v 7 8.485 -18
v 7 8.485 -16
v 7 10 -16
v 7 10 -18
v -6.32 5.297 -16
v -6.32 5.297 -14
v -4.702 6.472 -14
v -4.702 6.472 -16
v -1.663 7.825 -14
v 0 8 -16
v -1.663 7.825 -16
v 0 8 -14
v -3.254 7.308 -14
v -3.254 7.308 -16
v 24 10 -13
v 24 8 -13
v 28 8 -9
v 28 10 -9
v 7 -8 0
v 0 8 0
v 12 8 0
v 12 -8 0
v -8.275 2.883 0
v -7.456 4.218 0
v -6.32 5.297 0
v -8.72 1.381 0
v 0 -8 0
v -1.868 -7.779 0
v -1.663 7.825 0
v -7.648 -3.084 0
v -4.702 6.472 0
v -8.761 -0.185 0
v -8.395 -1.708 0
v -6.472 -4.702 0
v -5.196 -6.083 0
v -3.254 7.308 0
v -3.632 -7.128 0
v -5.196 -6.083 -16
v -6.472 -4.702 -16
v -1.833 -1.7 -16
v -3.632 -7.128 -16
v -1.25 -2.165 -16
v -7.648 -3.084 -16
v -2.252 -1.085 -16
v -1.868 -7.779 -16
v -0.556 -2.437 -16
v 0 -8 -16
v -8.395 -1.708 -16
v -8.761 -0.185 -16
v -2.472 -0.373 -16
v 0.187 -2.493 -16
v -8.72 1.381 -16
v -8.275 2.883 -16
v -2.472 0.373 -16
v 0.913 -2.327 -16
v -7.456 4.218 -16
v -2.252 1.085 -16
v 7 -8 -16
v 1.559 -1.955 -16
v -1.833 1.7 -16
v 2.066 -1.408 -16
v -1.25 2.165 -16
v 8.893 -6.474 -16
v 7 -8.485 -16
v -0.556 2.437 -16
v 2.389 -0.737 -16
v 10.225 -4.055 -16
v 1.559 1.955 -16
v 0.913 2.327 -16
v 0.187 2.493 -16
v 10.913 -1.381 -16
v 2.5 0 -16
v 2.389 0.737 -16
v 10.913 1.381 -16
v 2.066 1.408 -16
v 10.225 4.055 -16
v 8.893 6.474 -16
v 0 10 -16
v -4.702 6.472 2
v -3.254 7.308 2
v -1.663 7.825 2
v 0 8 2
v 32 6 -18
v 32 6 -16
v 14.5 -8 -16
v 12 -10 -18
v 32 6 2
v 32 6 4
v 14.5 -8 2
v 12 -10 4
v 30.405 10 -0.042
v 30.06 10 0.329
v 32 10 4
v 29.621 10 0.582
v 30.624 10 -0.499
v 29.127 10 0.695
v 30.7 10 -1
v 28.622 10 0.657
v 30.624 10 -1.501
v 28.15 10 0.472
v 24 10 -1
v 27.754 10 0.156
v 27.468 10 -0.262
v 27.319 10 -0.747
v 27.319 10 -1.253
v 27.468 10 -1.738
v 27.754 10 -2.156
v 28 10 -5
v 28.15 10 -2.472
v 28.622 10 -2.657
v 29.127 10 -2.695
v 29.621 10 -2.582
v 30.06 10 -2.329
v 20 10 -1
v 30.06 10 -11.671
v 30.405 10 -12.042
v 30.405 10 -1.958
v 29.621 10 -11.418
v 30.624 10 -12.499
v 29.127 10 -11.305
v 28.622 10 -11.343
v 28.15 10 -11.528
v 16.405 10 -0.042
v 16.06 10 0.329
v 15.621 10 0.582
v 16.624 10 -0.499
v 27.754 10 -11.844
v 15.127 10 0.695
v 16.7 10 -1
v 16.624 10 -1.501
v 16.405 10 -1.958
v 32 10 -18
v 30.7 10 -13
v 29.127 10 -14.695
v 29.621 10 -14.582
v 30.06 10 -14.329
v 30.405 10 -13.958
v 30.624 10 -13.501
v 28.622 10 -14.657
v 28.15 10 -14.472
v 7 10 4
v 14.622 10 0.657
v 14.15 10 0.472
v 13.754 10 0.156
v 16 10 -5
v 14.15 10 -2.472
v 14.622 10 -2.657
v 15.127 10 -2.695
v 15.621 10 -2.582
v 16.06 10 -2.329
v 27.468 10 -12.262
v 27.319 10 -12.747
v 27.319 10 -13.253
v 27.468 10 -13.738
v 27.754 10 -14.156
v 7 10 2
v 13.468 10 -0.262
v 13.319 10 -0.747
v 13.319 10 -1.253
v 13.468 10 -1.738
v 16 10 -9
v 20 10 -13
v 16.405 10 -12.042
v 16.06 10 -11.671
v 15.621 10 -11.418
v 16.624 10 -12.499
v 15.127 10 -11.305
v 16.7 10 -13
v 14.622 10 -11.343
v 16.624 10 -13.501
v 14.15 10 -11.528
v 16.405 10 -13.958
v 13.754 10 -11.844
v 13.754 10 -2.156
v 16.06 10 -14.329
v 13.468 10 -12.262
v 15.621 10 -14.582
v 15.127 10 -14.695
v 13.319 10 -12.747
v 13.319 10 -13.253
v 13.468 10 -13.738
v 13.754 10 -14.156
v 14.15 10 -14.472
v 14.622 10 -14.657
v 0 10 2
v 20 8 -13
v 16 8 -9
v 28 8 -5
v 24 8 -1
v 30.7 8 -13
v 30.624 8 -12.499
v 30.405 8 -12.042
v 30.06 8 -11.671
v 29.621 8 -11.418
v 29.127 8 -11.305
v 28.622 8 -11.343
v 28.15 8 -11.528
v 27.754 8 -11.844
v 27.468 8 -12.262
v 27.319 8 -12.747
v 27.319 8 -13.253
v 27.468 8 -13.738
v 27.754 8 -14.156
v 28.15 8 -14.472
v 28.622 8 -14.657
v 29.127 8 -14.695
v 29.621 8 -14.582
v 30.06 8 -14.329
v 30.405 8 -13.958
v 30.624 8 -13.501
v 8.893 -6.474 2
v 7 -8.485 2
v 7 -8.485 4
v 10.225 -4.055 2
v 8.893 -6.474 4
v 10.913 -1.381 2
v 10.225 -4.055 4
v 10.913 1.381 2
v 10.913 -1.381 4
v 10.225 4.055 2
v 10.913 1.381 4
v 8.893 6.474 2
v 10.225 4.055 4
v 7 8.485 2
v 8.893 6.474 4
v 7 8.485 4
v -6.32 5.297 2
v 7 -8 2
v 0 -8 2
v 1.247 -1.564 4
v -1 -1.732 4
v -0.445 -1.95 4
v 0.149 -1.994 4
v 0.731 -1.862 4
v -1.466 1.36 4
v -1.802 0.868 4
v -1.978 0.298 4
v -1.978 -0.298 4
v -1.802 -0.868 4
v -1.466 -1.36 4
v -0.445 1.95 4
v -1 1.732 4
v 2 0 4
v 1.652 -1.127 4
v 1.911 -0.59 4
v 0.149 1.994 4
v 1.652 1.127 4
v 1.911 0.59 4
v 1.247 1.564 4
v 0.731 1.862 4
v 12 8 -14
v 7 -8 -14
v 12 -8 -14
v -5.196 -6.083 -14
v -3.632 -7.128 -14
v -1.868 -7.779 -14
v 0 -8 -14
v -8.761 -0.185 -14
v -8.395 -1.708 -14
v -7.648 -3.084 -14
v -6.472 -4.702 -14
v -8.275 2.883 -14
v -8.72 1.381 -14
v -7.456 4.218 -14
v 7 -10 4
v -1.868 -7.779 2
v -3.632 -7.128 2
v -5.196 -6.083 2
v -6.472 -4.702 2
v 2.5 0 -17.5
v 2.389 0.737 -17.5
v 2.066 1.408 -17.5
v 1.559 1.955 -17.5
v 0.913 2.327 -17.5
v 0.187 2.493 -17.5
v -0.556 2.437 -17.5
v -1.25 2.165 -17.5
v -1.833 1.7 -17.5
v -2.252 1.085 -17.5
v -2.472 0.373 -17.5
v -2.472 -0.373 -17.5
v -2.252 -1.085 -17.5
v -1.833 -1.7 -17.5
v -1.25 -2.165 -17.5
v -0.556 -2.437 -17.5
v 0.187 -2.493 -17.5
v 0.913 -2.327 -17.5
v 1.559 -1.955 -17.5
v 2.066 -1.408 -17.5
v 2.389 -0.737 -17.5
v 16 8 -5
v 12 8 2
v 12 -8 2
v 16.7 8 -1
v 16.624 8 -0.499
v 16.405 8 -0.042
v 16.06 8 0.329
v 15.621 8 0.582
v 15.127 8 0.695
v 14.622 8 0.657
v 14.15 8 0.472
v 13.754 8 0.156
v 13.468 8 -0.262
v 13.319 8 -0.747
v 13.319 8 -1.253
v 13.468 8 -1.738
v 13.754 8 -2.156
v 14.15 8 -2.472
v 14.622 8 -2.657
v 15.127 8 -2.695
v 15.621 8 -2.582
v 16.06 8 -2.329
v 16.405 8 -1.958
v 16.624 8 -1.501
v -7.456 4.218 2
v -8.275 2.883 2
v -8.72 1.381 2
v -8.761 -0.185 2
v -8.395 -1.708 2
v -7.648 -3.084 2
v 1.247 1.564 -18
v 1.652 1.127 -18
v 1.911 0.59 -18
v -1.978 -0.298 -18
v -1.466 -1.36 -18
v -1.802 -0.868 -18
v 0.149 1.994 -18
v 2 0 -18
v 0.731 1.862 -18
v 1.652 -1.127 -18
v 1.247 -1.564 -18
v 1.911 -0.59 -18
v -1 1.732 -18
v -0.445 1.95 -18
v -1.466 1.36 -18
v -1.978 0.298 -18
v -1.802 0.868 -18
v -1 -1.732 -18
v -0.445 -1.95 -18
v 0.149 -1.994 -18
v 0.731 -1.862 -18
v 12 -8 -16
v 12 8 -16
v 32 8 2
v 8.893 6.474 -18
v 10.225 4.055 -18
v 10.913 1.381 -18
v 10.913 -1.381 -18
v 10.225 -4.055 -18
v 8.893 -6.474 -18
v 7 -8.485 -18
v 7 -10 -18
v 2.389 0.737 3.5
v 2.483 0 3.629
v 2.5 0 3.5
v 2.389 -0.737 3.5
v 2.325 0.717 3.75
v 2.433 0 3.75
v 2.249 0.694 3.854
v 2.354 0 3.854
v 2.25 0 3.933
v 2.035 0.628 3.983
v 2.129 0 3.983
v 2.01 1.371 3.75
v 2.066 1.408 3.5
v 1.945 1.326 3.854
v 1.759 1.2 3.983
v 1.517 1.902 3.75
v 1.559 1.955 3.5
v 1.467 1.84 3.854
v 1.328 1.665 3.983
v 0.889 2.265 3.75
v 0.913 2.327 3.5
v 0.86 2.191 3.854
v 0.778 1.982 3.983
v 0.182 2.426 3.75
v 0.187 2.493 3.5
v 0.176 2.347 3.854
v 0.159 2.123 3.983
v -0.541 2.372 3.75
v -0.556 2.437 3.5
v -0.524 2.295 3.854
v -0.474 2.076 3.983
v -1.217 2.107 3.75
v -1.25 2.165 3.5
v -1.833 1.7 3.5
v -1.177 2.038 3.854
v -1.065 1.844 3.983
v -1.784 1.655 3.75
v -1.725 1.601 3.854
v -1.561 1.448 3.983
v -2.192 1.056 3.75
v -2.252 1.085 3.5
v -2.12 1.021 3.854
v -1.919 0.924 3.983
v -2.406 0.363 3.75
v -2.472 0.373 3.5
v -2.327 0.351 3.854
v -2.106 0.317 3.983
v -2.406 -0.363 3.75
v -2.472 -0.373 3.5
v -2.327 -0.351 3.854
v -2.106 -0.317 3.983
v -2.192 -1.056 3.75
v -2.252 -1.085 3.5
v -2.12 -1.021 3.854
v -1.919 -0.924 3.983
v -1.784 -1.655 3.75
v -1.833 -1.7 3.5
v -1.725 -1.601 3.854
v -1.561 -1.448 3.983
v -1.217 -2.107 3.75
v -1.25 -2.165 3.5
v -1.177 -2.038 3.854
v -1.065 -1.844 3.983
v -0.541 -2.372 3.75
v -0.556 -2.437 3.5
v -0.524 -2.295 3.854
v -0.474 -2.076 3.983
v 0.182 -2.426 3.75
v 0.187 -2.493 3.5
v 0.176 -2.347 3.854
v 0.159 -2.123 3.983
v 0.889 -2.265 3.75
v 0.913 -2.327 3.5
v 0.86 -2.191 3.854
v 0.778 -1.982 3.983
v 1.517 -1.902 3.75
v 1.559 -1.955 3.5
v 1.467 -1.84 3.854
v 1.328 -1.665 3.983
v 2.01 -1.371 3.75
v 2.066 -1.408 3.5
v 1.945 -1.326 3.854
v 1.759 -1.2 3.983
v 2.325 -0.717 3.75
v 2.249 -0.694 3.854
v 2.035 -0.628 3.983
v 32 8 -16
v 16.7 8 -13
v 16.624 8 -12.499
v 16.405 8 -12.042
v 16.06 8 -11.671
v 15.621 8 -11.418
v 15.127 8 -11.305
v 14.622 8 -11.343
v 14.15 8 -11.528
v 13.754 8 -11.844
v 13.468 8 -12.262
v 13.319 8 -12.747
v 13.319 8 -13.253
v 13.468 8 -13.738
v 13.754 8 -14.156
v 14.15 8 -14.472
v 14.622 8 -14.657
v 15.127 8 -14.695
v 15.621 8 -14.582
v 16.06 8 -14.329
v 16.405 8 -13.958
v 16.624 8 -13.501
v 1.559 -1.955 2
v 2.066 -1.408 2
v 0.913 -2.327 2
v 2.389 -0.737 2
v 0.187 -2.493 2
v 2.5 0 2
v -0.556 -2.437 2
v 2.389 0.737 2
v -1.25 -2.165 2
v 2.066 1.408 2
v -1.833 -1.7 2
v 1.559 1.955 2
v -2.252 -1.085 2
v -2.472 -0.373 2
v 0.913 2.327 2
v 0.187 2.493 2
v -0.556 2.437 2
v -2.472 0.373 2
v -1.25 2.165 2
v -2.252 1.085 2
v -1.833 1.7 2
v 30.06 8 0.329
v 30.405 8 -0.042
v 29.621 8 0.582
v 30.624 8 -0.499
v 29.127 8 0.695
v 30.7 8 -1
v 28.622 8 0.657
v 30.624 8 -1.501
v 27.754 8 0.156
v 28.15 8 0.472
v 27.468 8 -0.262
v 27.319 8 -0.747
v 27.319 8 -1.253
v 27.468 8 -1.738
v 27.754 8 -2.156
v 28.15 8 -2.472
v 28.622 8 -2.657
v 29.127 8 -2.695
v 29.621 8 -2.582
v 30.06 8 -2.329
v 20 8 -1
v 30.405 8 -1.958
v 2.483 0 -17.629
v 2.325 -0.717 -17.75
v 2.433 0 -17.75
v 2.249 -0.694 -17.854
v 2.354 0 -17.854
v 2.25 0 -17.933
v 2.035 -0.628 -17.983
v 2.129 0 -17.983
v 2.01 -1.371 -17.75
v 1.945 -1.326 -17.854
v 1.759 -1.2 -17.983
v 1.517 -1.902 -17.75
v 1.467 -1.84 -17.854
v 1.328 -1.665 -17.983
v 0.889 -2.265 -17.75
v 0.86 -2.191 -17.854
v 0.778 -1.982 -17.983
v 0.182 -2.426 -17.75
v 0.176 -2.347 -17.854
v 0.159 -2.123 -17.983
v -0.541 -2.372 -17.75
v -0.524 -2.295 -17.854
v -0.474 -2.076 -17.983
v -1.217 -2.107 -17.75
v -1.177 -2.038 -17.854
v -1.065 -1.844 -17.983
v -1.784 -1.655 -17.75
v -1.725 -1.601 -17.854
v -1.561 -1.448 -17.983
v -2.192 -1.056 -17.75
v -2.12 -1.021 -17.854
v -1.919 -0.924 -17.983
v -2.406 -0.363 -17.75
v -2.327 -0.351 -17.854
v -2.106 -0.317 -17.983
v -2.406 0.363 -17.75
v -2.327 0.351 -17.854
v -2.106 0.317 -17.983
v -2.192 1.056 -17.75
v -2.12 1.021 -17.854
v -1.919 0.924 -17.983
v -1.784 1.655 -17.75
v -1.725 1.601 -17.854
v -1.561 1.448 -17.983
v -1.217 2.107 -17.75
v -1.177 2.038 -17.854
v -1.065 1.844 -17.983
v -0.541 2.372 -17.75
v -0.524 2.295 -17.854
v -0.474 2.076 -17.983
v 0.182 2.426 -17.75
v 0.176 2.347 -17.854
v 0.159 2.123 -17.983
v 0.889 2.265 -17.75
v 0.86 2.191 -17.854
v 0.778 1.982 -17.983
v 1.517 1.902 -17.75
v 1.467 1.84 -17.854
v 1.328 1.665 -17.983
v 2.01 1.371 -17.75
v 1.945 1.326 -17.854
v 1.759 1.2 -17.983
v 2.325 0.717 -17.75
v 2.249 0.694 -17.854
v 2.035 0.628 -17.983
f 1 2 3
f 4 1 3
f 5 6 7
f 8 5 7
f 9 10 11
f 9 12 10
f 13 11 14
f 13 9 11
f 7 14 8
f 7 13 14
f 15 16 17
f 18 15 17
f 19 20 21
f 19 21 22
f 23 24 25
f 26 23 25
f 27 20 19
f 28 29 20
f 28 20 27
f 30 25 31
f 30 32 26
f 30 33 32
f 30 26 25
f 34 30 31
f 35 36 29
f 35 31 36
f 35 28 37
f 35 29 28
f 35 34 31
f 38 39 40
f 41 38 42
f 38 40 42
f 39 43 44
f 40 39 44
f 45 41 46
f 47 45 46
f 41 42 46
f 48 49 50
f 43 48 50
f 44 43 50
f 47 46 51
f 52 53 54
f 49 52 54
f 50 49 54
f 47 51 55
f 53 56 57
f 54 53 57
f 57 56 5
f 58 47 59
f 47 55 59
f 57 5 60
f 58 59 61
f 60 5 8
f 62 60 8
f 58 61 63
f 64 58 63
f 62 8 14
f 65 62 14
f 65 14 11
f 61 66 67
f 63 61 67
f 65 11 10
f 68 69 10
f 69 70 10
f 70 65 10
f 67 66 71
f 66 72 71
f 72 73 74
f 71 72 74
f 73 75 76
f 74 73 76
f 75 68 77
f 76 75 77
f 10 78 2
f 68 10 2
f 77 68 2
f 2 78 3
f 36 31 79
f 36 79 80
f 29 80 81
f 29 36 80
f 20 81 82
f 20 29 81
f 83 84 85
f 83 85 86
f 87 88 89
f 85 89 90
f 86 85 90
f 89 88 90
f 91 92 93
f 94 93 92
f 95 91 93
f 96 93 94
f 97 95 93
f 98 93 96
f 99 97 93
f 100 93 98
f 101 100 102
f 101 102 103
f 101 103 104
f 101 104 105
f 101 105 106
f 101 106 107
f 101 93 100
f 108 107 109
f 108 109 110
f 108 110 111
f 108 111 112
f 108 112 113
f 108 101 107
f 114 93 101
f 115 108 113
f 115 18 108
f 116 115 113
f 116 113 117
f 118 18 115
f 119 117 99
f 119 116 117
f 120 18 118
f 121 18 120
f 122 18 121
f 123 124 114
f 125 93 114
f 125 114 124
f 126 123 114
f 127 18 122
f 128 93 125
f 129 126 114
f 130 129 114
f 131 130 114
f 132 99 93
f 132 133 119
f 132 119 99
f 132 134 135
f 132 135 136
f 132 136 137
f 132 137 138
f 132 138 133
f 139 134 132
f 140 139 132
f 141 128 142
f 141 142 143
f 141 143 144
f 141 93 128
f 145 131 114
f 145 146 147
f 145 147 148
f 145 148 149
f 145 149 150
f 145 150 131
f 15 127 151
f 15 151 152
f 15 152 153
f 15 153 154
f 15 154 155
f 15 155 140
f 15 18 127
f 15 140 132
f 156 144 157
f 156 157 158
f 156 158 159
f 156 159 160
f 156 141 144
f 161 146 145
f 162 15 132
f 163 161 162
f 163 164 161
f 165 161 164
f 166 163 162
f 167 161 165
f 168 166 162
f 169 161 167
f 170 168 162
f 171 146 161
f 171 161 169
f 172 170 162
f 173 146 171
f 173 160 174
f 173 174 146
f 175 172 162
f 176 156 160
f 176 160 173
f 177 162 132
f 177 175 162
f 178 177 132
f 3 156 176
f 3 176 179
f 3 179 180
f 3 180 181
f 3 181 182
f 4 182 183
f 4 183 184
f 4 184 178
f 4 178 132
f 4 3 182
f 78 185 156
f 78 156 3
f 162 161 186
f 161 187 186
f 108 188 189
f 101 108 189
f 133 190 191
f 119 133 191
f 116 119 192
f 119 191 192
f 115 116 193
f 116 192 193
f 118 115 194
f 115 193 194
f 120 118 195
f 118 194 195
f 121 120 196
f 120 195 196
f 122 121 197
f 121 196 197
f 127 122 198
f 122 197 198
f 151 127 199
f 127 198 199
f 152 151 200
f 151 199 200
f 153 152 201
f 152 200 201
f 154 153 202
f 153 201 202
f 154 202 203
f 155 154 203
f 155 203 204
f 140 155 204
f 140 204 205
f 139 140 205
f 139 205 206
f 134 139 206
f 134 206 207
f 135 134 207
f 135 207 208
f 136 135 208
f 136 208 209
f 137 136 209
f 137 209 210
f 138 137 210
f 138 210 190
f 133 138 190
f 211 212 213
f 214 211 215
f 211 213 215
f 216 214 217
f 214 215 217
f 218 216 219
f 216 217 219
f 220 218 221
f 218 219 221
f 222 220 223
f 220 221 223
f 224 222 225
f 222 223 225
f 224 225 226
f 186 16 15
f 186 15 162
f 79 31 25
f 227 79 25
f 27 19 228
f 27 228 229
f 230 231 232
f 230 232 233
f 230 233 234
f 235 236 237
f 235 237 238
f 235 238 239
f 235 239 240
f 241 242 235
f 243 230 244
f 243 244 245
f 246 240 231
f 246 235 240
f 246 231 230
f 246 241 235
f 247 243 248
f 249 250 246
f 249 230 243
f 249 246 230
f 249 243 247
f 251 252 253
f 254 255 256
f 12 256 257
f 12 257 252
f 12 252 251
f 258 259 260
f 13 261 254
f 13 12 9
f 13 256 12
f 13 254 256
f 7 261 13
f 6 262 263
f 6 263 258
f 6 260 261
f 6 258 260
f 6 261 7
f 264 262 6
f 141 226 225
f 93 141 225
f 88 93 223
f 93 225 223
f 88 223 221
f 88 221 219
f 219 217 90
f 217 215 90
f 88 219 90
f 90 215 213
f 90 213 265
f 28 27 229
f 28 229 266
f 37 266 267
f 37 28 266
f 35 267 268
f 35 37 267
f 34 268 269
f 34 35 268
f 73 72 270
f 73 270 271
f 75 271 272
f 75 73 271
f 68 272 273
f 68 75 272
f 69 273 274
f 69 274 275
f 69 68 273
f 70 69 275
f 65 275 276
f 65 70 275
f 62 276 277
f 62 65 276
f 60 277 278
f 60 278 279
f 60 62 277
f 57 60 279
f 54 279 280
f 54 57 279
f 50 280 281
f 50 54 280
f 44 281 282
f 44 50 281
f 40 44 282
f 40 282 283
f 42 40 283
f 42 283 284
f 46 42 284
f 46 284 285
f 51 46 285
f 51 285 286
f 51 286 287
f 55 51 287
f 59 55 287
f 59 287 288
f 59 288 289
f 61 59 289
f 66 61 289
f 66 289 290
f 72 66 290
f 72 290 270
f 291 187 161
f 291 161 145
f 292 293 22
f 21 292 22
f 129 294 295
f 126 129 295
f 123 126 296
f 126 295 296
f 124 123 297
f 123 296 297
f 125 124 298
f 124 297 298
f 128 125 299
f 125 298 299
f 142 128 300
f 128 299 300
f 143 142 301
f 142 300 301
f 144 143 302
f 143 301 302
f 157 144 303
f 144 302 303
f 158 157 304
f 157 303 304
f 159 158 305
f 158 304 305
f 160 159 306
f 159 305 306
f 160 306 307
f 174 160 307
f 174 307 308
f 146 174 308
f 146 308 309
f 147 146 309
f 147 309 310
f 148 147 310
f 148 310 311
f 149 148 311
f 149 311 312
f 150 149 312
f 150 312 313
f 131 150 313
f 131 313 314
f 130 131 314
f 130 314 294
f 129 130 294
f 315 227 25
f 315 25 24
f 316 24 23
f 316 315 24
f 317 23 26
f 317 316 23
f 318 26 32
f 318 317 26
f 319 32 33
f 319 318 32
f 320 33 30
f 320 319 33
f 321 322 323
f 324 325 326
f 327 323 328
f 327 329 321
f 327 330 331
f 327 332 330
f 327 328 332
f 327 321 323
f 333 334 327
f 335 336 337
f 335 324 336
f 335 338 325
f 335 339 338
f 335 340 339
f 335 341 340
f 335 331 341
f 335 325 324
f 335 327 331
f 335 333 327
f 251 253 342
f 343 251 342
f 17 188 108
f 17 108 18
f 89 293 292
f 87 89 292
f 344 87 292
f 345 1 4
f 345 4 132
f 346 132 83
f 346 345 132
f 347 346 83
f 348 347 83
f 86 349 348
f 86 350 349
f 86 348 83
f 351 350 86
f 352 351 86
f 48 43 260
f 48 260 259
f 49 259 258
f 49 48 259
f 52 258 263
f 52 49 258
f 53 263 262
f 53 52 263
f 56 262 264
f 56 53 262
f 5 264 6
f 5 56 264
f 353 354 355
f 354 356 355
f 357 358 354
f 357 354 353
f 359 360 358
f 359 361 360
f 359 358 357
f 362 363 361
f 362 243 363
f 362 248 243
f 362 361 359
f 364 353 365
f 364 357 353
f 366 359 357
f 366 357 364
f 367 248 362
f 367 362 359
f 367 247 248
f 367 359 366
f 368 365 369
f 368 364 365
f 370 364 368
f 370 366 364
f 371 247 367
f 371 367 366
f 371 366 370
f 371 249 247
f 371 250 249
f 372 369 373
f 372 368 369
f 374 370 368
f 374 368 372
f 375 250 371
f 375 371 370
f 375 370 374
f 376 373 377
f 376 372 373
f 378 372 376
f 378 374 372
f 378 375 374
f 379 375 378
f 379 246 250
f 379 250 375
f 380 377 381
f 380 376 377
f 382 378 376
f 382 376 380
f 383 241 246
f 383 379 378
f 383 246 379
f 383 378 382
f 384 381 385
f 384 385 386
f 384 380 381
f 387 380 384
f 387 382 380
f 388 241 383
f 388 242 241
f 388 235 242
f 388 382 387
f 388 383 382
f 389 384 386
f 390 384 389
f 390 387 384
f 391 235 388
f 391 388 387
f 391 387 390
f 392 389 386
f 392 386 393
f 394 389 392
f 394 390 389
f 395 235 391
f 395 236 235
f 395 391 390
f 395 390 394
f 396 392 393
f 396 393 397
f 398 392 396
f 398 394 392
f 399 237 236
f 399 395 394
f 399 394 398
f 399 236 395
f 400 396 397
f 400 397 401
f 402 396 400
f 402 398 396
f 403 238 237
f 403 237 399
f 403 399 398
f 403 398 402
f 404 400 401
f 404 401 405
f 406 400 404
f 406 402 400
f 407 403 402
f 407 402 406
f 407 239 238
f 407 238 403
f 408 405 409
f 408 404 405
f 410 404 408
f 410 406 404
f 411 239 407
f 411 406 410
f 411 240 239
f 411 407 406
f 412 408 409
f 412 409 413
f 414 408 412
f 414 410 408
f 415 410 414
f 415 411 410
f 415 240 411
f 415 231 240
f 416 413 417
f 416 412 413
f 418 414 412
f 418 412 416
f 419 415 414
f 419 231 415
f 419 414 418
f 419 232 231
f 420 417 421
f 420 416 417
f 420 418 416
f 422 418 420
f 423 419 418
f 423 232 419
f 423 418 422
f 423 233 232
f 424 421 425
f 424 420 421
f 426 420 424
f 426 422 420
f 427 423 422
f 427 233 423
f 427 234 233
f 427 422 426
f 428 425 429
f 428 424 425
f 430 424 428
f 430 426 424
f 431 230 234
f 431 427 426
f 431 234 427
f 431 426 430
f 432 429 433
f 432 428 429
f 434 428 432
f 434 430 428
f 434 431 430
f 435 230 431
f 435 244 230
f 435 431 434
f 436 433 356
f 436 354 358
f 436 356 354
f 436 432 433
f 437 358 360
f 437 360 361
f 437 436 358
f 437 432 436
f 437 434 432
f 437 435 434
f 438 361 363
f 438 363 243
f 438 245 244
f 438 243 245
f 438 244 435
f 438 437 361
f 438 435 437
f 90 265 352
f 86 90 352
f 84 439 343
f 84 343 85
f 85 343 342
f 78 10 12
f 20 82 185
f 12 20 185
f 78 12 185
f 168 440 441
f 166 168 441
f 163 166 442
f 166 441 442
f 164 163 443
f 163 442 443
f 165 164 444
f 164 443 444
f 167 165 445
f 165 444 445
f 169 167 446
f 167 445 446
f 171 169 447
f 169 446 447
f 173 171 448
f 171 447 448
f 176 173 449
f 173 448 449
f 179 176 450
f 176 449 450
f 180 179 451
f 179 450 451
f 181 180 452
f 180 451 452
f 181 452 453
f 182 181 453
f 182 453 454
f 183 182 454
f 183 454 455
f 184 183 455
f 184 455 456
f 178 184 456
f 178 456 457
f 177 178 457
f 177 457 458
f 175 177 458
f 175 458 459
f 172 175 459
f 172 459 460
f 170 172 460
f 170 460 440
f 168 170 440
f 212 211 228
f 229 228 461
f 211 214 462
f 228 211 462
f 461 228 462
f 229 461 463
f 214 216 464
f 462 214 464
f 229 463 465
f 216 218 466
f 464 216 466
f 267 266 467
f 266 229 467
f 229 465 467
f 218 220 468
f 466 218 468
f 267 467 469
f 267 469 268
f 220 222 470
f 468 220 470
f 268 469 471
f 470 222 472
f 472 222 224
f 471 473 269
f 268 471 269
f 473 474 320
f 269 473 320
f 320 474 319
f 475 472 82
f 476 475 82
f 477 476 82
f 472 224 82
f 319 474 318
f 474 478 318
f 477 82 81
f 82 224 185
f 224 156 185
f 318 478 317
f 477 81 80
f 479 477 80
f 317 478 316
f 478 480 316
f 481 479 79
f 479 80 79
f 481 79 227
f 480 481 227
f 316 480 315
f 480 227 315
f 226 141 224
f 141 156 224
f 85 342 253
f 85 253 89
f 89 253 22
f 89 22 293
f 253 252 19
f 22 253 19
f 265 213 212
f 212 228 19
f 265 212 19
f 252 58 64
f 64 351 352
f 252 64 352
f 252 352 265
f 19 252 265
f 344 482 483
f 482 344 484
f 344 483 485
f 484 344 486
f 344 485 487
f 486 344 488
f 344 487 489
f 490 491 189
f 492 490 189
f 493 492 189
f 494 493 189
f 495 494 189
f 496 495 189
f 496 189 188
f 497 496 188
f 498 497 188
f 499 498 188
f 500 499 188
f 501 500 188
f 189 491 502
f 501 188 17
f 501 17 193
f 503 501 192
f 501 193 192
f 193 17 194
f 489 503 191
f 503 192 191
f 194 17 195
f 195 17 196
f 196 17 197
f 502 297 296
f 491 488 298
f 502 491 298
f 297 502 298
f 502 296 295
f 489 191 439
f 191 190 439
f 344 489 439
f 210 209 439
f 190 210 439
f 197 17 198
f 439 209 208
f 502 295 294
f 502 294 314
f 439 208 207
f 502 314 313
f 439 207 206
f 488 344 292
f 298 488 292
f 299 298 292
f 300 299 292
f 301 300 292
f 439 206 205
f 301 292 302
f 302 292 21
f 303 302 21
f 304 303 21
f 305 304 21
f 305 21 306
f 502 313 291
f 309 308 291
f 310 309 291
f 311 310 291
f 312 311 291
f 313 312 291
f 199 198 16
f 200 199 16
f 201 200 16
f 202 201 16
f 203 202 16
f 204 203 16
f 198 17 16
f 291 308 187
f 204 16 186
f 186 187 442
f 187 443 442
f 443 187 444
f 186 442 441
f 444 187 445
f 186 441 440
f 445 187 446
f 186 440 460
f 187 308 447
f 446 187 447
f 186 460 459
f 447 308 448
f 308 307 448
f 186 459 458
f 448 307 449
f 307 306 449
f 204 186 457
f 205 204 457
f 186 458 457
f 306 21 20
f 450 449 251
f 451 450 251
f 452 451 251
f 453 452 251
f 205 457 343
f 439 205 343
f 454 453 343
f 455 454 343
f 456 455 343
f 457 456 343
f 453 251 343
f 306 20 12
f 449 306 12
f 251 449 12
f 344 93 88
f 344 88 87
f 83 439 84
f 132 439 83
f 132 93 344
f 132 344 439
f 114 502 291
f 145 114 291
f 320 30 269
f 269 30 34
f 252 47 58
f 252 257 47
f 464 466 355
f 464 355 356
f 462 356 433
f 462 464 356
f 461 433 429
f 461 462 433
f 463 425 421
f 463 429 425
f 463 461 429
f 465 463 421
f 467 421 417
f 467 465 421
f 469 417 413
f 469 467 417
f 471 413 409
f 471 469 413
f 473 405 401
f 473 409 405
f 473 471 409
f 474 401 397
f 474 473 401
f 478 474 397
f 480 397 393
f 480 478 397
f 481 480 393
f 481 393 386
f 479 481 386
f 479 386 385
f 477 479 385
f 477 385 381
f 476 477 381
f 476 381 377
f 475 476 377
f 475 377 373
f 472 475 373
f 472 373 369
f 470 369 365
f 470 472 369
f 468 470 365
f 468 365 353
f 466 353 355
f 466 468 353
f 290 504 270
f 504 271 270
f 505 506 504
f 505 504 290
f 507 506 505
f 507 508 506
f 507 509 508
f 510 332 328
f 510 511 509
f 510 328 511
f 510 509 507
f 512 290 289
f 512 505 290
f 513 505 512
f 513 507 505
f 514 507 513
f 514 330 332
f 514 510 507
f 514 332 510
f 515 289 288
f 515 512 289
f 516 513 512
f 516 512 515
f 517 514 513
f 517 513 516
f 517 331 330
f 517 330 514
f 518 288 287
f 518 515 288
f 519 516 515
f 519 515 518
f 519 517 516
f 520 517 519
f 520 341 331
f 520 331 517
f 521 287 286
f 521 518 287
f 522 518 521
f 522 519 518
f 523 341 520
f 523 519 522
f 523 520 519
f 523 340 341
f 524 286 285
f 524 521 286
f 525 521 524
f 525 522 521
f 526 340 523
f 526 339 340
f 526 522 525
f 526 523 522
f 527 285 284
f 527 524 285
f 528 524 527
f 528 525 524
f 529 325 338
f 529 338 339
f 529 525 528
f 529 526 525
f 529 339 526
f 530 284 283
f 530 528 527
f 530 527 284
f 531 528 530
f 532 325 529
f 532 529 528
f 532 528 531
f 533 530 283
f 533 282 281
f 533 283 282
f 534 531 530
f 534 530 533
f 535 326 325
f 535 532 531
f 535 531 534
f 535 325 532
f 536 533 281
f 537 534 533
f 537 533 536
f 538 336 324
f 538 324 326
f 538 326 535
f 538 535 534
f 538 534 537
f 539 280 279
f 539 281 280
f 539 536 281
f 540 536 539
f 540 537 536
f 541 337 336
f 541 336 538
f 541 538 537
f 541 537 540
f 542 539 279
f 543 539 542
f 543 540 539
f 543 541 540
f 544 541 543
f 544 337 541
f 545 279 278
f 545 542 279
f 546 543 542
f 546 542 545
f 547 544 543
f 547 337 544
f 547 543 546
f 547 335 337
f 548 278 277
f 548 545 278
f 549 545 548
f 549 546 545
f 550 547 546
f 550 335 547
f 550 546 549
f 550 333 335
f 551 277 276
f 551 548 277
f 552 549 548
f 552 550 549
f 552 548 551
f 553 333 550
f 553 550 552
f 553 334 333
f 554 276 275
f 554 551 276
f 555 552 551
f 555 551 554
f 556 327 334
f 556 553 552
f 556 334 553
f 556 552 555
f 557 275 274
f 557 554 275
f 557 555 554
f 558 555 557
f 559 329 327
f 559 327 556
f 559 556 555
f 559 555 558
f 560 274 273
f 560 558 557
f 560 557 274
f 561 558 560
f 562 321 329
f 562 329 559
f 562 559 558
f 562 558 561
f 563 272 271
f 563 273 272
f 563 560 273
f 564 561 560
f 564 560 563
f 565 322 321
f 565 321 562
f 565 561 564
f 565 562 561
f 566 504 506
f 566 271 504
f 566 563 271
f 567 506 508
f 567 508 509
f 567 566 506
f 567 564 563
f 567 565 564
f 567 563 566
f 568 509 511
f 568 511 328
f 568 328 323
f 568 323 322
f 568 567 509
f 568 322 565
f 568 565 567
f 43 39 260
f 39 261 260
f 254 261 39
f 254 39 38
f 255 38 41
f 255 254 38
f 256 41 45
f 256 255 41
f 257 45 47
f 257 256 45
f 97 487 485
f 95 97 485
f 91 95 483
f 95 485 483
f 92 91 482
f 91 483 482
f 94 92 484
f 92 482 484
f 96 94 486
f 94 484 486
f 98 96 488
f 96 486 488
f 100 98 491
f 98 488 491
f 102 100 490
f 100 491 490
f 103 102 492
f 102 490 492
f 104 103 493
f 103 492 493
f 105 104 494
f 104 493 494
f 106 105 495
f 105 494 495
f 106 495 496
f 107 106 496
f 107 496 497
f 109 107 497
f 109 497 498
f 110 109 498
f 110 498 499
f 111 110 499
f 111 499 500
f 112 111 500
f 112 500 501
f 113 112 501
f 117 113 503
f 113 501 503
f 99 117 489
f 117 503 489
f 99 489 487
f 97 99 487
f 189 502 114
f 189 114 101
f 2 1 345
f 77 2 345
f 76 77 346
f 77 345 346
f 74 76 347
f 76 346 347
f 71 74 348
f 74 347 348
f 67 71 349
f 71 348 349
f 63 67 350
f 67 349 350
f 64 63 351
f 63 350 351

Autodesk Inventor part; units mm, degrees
ref_plane "YZ Plane" through (0, 0, 0) normal (1, 0, 0) x (0, 1, 0)
sketch "Sketch1" plane through (0, 0, 0) normal (0, 0, 1) x (1, 0, 0)
  circle A0 centre (0, 0) radius 2.5
  circle A1 centre (20, 0) radius 2.5
  line L0 (7, 10) -> (20, 10)
  line L1 (7, -10) -> (20, -10)
  arc A2 (20, -10) -> (20, 10) centre (20, 0) ccw
  line L2 (7, 10) -> (7, 8)
  line L3 (7, -10) -> (7, -8)
  line L4 (7, 8) -> (0, 8)
  line L5 (7, -8) -> (0, -8)
  arc A3 (0, 8) -> (0, -8) centre (0, 0) ccw
  dimension "d0" = 5
  dimension "d1" = 20
  dimension "d2" = 10
  dimension "d3" = 2
  dimension "d4" = 13
extrude "Extrusion1" add sketch "Sketch1" along normal blind 4
sketch "Sketch2" plane through (0, 0, 4) normal (0, 0, 1) x (1, 0, 0)
  circle A0 centre (0, 0) radius 2.5 projected
  line L0 (7, 8) -> (0, 8) projected
  arc A1 (0, 8) -> (0, -8) centre (0, 0) ccw projected
  line L1 (0, -8) -> (7, -8) projected
  line L2 (7, -10) -> (20, -10) projected
  line L3 (7, 8) -> (7, -8)
  line L4 (7, -8) -> (0, -8)
  line L5 (7, 8) -> (0, 8)
  arc A2 (0, 8) -> (0, -8) centre (0, 0) ccw
extrude "Extrusion2" cut sketch "Sketch2" against normal blind 2
sketch "Sketch3" plane through (0, 0, 0) normal (0, 0, -1) x (-1, 0, 0)
  circle A0 centre (-20, 0) radius 2.5 projected
  circle A1 centre (0, 0) radius 2.5 projected
  line L0 (-7, 10) -> (-20, 10) projected
  arc A2 (-20, 10) -> (-20, -10) centre (-20, 0) ccw projected
  line L1 (-20, -10) -> (-7, -10) projected
  line L2 (-7, 8) -> (-7, 10) projected
  line L3 (-19, 10) -> (-19, 8)
  line L4 (-19, 8) -> (-11, 8)
  line L5 (-11, 8) -> (-11, -8)
  line L6 (-11, -8) -> (-19, -8)
  line L7 (-19, -8) -> (-19, -10)
  point P0 (-7, -8)
  dimension "d9" = 1
  dimension "d10" = 11
extrude "Extrusion3" cut sketch "Sketch3" against normal blind 2 contours L3 L4 L5 L6 L7 L1 A2 L0
sketch "Sketch4" plane through (0, 0, 4) normal (0, 0, 1) x (1, 0, 0)
  line L0 (7, 10) -> (7, -10)
  circle A0 centre (0, 0) radius 2.5
  arc A1 (7, -8.485281) -> (7, 8.485281) centre (0, 0) ccw
  dimension "d15" = 11
extrude "Extrusion4" cut sketch "Sketch4" against normal blind 2 contours A1 L0
sketch "Sketch5" plane through (0, 0, 0) normal (0, 0, -1) x (-1, 0, 0)
  line L0 (0, 8) -> (-7, 8) projected
  line L1 (-7, 10) -> (0, 10)
  line L2 (0, 10) -> (0, 8)
  line L3 (0, 8) -> (-7, 8)
  line L4 (-7, 8) -> (-7, 10)
  arc A0 (0, -8) -> (0, 8) centre (0, 0) ccw projected
extrude "Extrusion5" add sketch "Sketch5" against normal blind 2
sketch "Sketch6" plane through (0, 0, 0) normal (0, 0, -1) x (-1, 0, 0)
  line L0 (0, 10) -> (-19, 10) projected
  line L1 (-19, 8) -> (-20, 8)
  line L2 (-20, 8) -> (-20, 10)
  line L3 (-20, 10) -> (-19, 10)
  line L4 (-19, 10) -> (-19, 8)
  circle A0 centre (-20, 0) radius 2.5 projected
extrude "Extrusion6" add sketch "Sketch6" against normal blind 2 contours L1 L2 L3 L4
sketch "Sketch7" plane through (0, 0, 0) normal (0, 0, -1) x (-1, 0, 0)
  line L0 (-19, -8) -> (-19, -10)
  line L1 (-11, -8) -> (-19, -8)
  line L2 (-17.400642, -8) -> (-19, -9.162001)
  line L3 (-17.400642, -8) -> (-26.805206, 4.944272) construction
  line L4 (-26.805206, 4.944272) -> (-28.404564, 3.782271) construction
  line L5 (-28.404564, 3.782271) -> (-19, -9.162001) construction
  circle A0 centre (-20, 0) radius 2.5
  line L6 (-17.400642, -8) -> (-19, -8)
  line L7 (-19, -8) -> (-19, -9.162001)
  dimension "d21" = 16
  dimension "d22" = 8
  dimension "d23" = 36
extrude "Extrusion7" cut sketch "Sketch7" against normal blind 2 contours L1 L2 L0
sketch "Sketch9" plane through (0, 0, 2) normal (0, 0, 1) x (1, 0, 0)
  circle A0 centre (0, 0) radius 2.5
  arc A1 (11, 0) -> (7, 8.485281) centre (0, 0) ccw
  circle A2 centre (0, 0) radius 2.5
extrude "Extrusion8" add sketch "Sketch9" along normal mid plane 4
fillet "Fillet1" radius 0.5 1 edges at (-2.5, 0, 4)
sketch "Sketch10" plane through (0, 0, 0) normal (0, 0, -1) x (-1, 0, 0)
  arc A0 (0, -8) -> (0, 8) centre (0, 0) ccw
  line L0 (0, 10) -> (-20, 10)
  line L1 (4.702282, 6.472136) -> (11.174418, 1.769854)
  line L2 (11.174418, 1.769854) -> (6.472136, -4.702282)
  dimension "d30" = 144
extrude "Extrusion9" add sketch "Sketch10" against normal blind 2
fillet "Fillet2" radius 6 1 edges at (-11.1744, 1.7699, 1)
ref_plane "Work Plane1" through (11, 0, 4) normal (1, 0, 0) x (0, 1, 0)
split "Split1" plane through (11, 0, 4) removes the side toward (1, 0, 0)
sketch "Sketch11" plane through (11, -10, 0) normal (1, 0, 0) x (0, 0, -1)
  line L0 (0, 20) -> (0, 0) projected
  line L1 (-4, 20) -> (0, 20) projected
  line L2 (-4, 10) -> (-4, 20) projected
  line L3 (-4, 0) -> (-4, 10) projected
  line L4 (0, 0) -> (-4, 0) projected
  point P0 (0, 10)
extrude "Extrusion10" add sketch "Sketch11" along normal blind 1
ref_plane "Work Plane2" through (0, 0, -7) normal (0, 0, -1) x (-1, 0, 0)
mirror "Mirror1" about plane through (0, 0, -7) normal (0, 0, -1)
sketch "Sketch12" plane through (0, 0, 0) normal (0, 0, -1) x (-1, 0, 0)
  line L0 (-12, -10) -> (-7, -10)
  line L1 (-7, -10) -> (-7, -8)
  arc A0 (4.702282, 6.472136) -> (0, 8) centre (0, 0) ccw
  line L2 (0, 8) -> (0, 10)
  line L3 (0, 10) -> (-12, 10)
  line L4 (-12, -10) -> (-12, 10)
  line L5 (0, 8) -> (-12, 8)
  line L6 (-7, -8) -> (-12, -8)
extrude "Extrusion11" add sketch "Sketch12" along normal blind 14
sketch "Sketch13" plane through (12, -10, 0) normal (1, 0, 0) x (0, 0, -1)
  line L0 (0, 18) -> (14, 18) projected
  line L1 (0, 2) -> (14, 2) projected
  line L2 (-4, 0) -> (18, 0) projected
  line L3 (18, 20) -> (18, 0) projected
  line L4 (-4, 20) -> (18, 20) projected
  line L5 (-4, 20) -> (-4, 0) projected
  line L6 (-2, 18) -> (16, 18)
  line L7 (16, 18) -> (16, 2)
  line L8 (16, 2) -> (-2, 2)
  line L9 (-2, 2) -> (-2, 18)
  point P0 (0, 10)
  dimension "d39" = 2
  dimension "d40" = 2
extrude "Extrusion12" add sketch "Sketch13" along normal blind 20
sketch "Sketch17" plane through (0, 0, 4) normal (0, 0, 1) x (1, 0, 0)
  line L0 (7, -10) -> (32, -10) projected
  line L1 (32, 10) -> (32, -10) projected
  line L2 (32, 6) -> (12, -10)
  dimension "d73" = 4
  dimension "d74" = 20
extrude "Extrusion16" cut sketch "Sketch17" against normal blind 22
sketch "Sketch18" plane through (0, 8, 0) normal (0, -1, 0) x (1, 0, 0)
  line L0 (12, -16) -> (32, -16) projected
  line L1 (32, 2) -> (32, -16) projected
  line L2 (12, 2) -> (32, 2) projected
  line L3 (15, -1) -> (29, -1) construction
  line L4 (29, -1) -> (29, -13) construction
  line L5 (29, -13) -> (15, -13) construction
  line L6 (15, -13) -> (15, -1) construction
  circle A0 centre (15, -13) radius 1.7
  circle A1 centre (15, -1) radius 1.7
  circle A2 centre (29, -1) radius 1.7
  circle A3 centre (29, -13) radius 1.7
  line L7 (20, -1) -> (24, -1)
  line L8 (28, -5) -> (28, -9)
  line L9 (24, -13) -> (20, -13)
  line L10 (16, -9) -> (16, -5)
  line L11 (16, -9) -> (20, -13)
  line L12 (24, -13) -> (28, -9)
  line L13 (28, -5) -> (24, -1)
  line L14 (20, -1) -> (16, -5)
  point P0 (16, -7)
  point P1 (15, -7)
  dimension "d77" = 3.4
  dimension "d78" = 45
  dimension "d79" = 4
  dimension "d80" = 3
  dimension "d81" = 3
  dimension "d82" = 3
  dimension "d83" = 14
  dimension "d84" = 1
  dimension "d85" = 1
extrude "Extrusion17" cut sketch "Sketch18" against normal through all
properties part number "y_axis_cable_mount_b" material "ABS Plastic"
